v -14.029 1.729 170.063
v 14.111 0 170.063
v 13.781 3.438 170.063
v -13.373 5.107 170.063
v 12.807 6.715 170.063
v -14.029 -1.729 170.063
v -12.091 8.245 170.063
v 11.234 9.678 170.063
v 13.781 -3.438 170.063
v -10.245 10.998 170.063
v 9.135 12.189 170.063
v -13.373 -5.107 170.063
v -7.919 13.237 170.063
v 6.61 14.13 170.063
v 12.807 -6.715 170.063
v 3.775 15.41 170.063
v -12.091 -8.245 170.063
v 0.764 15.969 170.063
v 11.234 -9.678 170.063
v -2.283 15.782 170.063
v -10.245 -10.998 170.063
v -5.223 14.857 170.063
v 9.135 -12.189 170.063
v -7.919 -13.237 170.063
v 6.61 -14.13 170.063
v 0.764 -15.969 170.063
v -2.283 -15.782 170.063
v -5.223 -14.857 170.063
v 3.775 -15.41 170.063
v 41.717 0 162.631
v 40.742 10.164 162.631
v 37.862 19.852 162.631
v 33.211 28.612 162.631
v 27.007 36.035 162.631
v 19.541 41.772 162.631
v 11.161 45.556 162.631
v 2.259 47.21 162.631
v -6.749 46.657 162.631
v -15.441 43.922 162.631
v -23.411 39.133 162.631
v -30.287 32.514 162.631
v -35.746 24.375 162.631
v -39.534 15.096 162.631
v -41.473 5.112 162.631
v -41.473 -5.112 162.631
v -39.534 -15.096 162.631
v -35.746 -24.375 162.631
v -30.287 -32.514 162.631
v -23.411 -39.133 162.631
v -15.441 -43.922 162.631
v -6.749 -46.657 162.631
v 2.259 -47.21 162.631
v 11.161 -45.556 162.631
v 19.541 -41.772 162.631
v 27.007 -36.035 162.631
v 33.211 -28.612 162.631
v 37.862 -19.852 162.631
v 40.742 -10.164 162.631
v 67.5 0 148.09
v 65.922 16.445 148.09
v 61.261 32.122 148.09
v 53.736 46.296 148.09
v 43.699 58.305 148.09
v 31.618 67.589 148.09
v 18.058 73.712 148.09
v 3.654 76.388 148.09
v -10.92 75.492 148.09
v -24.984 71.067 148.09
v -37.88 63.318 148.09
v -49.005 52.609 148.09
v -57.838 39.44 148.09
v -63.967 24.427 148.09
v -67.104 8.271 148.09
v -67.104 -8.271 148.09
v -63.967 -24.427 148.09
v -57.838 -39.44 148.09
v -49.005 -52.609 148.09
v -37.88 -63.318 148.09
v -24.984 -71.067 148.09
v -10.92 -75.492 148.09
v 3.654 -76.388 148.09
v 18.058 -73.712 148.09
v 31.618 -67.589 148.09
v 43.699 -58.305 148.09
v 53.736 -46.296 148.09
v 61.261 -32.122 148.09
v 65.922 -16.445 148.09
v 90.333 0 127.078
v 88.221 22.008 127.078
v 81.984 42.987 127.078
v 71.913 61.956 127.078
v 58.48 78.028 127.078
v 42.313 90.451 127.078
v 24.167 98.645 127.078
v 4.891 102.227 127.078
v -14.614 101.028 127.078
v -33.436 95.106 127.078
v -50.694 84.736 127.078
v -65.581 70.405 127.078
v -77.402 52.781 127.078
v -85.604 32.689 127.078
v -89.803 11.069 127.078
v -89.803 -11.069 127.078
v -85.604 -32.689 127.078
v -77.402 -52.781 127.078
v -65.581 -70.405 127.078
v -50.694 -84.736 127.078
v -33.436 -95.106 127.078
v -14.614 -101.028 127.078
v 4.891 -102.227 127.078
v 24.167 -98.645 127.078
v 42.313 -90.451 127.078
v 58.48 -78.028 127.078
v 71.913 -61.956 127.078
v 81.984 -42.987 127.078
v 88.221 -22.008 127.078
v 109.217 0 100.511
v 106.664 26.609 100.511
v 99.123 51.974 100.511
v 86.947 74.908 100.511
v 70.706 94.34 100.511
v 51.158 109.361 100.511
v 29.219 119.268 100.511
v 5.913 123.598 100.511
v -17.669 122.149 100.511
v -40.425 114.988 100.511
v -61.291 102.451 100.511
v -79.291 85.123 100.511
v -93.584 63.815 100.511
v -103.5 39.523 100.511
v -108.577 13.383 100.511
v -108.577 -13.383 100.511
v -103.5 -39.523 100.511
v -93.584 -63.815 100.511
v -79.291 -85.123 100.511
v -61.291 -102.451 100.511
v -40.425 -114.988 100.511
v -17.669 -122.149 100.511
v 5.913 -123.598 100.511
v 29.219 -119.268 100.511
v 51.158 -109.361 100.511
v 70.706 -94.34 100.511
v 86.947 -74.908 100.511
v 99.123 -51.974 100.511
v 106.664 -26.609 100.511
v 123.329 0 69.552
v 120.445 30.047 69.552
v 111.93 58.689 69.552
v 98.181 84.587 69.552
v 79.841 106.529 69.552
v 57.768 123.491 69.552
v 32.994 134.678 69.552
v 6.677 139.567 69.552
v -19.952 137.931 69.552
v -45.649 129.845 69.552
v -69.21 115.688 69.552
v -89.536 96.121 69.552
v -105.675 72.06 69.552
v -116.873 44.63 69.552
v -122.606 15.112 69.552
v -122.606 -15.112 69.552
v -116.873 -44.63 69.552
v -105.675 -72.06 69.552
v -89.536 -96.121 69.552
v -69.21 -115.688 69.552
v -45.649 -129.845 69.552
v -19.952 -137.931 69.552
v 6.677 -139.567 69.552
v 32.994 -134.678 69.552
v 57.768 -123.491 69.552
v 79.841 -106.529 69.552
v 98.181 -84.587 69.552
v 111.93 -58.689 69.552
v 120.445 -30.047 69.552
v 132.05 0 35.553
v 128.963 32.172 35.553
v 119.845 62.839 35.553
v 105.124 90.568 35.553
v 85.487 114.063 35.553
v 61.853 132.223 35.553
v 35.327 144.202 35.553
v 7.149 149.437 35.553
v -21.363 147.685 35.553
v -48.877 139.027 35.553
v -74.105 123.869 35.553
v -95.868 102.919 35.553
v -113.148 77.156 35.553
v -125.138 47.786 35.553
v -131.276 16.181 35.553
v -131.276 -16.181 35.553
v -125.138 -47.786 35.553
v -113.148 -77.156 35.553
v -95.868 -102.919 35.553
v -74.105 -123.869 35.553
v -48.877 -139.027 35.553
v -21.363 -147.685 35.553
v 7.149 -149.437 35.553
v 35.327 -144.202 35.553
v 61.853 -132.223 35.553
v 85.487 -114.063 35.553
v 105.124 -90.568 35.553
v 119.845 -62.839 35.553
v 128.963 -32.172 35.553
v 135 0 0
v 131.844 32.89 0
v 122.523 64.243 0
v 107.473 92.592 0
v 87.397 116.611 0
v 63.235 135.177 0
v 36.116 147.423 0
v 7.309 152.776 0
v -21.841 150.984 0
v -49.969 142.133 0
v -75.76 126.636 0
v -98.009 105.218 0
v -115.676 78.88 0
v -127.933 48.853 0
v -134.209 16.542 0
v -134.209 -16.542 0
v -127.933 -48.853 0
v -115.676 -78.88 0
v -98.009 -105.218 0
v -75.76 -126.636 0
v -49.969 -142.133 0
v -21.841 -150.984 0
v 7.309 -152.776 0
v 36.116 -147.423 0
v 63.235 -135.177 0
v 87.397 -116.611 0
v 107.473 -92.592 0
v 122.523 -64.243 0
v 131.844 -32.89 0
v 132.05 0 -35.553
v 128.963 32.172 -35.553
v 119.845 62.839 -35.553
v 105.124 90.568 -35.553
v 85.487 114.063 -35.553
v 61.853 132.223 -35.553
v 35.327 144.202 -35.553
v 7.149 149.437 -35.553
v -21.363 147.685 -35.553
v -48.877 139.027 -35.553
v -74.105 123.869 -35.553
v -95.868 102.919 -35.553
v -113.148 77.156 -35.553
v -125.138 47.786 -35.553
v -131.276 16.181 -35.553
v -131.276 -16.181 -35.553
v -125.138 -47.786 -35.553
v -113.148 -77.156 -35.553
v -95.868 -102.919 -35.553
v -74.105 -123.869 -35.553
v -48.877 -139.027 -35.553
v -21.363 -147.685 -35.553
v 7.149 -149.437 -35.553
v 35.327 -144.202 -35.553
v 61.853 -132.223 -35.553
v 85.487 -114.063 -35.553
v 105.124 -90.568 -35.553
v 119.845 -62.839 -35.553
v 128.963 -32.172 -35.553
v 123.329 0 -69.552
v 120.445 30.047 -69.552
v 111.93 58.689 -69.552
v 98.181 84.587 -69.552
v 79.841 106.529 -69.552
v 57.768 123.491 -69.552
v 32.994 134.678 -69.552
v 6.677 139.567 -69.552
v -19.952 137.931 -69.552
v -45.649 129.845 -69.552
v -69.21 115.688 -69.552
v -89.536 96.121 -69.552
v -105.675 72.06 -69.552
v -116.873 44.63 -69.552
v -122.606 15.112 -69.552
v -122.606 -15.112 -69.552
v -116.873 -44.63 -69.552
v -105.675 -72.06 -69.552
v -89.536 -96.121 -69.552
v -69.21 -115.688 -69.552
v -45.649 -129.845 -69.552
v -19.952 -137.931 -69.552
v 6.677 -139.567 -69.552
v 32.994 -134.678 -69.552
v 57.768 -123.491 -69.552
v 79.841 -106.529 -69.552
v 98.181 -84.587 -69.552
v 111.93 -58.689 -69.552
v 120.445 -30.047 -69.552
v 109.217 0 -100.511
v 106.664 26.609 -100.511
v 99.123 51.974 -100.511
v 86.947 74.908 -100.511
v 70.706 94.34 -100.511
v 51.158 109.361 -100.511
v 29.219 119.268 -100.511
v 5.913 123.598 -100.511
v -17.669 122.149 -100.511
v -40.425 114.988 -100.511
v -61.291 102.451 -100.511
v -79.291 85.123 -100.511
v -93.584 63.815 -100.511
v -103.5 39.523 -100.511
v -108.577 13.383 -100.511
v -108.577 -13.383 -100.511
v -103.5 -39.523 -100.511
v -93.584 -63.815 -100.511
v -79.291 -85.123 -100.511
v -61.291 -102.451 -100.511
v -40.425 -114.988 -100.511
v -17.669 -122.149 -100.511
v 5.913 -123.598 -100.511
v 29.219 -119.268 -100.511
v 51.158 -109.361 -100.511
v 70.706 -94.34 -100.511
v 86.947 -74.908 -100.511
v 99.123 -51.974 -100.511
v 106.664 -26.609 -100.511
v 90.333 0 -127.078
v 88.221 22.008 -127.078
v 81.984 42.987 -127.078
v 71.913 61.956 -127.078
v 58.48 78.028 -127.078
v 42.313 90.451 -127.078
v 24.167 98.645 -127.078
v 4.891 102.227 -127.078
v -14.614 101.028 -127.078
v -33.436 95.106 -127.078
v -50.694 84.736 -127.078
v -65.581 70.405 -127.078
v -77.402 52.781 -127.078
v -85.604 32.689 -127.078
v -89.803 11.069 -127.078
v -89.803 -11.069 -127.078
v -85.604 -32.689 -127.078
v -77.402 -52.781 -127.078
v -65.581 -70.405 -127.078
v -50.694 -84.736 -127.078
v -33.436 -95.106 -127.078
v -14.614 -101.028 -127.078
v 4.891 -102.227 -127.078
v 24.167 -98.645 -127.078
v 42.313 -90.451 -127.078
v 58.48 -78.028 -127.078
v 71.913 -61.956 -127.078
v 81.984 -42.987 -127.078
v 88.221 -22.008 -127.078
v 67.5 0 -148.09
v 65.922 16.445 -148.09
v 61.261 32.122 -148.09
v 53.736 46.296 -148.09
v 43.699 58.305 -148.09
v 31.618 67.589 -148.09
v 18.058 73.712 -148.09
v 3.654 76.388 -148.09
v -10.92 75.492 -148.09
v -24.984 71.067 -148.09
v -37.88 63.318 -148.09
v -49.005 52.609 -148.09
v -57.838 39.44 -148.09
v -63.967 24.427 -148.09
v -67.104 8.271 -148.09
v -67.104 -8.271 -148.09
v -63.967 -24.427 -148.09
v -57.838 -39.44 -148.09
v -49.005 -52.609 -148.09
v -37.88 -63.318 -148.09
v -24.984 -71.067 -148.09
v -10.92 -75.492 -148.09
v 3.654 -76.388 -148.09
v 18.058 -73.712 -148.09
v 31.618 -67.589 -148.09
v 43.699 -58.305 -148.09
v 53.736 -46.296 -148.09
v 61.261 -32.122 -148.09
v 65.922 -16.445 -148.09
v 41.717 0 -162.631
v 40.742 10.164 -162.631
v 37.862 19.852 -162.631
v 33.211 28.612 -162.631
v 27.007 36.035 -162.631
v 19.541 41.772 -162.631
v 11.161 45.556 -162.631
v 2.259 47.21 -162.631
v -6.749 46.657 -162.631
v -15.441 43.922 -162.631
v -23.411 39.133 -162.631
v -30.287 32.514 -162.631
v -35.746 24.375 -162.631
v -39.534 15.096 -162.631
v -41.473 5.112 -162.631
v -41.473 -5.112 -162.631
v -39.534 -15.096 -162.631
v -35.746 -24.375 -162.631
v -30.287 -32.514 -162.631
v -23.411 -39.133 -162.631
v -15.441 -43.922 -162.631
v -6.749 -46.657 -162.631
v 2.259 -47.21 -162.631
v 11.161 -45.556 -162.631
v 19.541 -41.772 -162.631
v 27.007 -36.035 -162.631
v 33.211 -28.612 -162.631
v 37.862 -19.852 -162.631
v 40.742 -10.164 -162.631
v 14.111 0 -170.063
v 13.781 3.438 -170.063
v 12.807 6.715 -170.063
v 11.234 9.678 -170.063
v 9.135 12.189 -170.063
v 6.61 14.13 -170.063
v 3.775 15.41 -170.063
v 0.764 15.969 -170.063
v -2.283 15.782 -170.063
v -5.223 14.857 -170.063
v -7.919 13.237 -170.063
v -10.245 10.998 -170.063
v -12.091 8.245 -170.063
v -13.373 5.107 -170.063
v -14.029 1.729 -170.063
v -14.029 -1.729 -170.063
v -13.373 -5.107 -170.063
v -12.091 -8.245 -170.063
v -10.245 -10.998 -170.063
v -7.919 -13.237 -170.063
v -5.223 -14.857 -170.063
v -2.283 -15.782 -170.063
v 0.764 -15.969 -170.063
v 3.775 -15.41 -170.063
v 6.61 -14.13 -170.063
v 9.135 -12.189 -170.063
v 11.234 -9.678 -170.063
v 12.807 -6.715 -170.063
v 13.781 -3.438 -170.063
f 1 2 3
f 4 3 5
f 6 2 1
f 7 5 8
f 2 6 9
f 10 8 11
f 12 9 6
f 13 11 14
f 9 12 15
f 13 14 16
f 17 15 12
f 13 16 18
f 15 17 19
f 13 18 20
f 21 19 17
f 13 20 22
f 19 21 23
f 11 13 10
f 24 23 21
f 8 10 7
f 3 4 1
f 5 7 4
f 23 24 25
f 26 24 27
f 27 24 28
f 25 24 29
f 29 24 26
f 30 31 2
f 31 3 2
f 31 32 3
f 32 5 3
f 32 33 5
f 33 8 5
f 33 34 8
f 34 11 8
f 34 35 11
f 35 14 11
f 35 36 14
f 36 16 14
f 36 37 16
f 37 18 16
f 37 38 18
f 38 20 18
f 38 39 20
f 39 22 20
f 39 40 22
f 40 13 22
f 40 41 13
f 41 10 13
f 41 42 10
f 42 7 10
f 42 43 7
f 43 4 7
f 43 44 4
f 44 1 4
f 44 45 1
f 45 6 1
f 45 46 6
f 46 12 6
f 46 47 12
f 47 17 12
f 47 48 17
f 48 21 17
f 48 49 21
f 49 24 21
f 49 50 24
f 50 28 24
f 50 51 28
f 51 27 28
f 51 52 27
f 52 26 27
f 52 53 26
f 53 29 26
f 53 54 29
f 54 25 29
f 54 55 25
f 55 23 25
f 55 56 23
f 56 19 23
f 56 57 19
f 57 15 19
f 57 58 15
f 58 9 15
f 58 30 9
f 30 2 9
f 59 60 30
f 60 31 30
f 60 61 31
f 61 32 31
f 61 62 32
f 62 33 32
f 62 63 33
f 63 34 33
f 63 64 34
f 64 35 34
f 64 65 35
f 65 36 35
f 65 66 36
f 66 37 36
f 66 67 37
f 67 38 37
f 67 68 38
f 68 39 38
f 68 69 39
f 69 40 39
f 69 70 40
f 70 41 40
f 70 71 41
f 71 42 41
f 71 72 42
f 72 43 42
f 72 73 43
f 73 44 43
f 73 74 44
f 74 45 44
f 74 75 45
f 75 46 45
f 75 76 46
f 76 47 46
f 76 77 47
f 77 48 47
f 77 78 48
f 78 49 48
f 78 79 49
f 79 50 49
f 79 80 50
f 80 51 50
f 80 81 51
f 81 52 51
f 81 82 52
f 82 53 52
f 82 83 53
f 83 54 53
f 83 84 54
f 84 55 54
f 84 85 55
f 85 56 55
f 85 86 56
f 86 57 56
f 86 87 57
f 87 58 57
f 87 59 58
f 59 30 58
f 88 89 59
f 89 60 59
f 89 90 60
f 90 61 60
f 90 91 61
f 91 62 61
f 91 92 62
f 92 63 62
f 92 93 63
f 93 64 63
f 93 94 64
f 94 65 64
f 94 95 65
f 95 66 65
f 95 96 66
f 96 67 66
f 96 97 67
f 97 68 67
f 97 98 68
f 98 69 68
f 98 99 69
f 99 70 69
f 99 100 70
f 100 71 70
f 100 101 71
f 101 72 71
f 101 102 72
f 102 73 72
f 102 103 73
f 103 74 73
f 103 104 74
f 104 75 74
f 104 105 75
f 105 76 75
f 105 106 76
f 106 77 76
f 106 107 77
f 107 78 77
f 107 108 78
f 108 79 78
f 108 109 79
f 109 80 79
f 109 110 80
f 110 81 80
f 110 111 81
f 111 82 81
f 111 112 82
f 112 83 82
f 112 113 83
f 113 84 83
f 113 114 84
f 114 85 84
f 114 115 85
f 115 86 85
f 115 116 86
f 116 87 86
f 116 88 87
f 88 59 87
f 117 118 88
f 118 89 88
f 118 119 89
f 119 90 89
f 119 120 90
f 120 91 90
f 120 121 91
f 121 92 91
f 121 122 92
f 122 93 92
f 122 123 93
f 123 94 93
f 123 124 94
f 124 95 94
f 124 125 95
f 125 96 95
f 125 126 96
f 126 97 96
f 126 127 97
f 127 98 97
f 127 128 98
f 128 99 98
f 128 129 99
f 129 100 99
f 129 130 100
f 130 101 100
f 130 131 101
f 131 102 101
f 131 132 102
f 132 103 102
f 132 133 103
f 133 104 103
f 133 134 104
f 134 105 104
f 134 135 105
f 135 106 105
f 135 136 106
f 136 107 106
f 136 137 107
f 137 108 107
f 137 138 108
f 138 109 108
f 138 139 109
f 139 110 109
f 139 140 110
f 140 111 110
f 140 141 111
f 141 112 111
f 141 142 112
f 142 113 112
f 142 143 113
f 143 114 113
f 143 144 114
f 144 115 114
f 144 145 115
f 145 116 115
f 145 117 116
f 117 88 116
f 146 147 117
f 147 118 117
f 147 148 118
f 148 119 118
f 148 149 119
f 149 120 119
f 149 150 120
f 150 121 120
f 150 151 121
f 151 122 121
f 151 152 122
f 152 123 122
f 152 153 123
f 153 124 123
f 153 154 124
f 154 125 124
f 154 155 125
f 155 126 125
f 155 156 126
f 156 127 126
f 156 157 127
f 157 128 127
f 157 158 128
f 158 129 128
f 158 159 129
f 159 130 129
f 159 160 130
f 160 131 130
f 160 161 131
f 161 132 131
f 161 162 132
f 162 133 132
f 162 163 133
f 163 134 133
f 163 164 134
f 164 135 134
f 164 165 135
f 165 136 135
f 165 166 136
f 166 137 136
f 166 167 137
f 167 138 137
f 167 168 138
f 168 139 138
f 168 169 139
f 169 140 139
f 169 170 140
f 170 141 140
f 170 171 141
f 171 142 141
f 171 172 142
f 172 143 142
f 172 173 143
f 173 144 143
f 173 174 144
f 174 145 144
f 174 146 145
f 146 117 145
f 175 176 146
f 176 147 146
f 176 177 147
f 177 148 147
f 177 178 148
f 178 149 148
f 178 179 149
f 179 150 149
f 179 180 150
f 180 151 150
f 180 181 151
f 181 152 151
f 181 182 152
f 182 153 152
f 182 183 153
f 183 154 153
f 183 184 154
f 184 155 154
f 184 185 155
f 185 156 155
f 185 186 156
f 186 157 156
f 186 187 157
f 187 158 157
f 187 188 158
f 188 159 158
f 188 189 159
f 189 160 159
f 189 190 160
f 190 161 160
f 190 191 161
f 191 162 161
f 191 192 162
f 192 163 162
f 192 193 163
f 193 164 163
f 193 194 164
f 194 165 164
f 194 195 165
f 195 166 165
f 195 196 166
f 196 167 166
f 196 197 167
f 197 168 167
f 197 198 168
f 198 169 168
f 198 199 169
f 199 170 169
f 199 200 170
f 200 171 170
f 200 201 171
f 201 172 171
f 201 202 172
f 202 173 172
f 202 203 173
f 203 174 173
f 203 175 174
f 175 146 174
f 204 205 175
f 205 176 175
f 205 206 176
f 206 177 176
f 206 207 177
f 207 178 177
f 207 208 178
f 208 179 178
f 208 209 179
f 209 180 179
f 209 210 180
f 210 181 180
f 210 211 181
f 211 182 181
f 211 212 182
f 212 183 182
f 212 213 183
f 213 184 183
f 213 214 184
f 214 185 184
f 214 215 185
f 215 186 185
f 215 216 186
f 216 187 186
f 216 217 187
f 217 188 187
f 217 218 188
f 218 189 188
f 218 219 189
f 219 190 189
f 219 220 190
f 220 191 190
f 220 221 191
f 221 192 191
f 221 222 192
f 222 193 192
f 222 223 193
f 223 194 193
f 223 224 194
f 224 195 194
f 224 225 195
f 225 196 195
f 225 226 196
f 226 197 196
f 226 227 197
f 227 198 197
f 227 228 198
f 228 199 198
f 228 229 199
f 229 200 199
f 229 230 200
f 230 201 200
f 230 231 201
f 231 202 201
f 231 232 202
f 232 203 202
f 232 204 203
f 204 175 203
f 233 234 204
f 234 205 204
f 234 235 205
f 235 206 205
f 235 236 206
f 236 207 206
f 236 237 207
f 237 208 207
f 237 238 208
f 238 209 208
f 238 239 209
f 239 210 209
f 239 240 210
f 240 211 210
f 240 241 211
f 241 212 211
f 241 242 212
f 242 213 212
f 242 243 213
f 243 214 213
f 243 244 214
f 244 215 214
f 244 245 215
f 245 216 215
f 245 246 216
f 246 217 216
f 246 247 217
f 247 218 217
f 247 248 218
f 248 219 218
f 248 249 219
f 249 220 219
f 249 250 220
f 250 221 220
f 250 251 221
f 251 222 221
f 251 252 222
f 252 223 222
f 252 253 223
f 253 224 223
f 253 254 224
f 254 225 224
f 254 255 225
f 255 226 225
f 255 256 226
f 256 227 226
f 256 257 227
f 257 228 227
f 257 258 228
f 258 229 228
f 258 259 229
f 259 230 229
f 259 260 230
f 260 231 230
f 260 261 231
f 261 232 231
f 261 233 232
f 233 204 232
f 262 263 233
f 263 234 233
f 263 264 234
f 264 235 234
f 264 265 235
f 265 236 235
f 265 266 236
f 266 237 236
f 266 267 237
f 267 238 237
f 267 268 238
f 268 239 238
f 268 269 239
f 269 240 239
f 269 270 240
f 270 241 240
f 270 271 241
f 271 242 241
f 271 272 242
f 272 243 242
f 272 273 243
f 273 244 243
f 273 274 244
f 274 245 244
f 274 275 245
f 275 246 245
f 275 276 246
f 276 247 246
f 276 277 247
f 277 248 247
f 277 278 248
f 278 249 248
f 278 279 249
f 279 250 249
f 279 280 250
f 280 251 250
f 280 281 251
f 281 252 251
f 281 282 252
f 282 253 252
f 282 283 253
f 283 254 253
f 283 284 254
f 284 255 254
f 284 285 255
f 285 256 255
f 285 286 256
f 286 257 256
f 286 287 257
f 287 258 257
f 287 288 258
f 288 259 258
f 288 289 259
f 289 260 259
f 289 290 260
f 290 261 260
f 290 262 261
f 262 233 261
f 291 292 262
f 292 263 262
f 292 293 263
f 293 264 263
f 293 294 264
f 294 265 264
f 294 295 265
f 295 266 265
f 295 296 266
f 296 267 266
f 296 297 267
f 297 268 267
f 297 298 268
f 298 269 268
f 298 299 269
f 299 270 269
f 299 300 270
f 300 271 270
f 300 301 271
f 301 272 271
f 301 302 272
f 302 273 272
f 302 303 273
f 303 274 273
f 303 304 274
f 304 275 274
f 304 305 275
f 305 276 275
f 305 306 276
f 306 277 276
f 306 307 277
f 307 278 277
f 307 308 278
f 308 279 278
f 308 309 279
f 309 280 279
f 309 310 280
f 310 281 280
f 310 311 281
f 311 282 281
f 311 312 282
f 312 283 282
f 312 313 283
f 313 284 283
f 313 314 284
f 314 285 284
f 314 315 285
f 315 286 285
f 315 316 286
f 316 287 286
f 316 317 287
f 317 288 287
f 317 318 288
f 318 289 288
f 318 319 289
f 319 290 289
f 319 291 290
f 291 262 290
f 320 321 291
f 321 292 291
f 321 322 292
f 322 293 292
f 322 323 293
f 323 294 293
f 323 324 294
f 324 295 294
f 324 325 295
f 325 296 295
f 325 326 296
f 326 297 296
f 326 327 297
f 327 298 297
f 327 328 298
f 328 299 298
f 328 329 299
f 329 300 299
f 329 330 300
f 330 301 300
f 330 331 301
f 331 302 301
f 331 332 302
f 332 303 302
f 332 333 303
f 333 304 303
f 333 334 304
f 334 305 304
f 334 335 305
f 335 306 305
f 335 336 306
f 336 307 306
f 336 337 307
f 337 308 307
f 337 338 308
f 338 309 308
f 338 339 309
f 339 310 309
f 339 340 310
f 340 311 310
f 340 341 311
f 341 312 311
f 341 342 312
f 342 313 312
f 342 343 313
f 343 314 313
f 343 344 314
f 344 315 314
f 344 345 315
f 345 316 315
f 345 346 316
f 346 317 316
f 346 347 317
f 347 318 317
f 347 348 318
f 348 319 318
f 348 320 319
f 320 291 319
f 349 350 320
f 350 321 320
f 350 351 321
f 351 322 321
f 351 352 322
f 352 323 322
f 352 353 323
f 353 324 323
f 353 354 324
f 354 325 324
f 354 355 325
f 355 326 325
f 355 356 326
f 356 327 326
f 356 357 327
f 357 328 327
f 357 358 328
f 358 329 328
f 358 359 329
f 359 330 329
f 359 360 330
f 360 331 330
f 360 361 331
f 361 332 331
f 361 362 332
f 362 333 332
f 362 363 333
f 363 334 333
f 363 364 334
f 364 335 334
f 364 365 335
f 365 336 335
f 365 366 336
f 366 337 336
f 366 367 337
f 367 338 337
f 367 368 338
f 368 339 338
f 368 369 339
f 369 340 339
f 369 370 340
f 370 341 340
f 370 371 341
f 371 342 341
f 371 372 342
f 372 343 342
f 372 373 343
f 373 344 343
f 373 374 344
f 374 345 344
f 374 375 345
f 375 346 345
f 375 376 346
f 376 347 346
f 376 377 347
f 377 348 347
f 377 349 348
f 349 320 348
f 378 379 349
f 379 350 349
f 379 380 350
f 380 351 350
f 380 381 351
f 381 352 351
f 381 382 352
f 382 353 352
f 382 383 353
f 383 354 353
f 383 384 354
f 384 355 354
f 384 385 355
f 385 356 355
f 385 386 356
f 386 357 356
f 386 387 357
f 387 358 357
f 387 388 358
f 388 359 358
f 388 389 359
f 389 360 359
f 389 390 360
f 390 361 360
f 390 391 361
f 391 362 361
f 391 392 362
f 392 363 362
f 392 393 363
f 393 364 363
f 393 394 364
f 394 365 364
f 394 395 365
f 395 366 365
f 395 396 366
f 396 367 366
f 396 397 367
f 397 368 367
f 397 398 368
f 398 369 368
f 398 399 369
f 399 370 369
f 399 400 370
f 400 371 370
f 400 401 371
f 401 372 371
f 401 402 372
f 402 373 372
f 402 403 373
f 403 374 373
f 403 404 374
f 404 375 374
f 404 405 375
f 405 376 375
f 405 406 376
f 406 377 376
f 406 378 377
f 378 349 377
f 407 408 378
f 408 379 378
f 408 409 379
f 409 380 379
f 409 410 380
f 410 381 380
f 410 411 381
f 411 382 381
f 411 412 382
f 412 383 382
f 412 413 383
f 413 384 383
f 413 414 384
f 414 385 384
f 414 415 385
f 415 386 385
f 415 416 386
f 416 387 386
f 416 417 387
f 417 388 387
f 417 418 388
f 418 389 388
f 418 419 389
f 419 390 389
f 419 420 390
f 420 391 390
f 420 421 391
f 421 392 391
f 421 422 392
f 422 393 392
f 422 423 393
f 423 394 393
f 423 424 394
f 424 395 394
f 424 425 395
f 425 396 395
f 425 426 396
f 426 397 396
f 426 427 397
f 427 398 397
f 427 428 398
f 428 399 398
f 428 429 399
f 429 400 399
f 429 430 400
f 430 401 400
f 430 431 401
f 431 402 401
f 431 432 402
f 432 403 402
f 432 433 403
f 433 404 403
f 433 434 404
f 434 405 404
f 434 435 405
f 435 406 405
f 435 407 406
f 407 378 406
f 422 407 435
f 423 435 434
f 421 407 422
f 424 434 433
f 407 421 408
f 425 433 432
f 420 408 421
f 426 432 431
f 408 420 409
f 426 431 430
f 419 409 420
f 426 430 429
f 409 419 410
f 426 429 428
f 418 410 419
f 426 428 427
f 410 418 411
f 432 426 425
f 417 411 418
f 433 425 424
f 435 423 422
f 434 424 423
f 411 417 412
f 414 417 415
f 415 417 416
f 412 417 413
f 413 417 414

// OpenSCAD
// Generated by SolidPython 1.0.1 on 2020-07-29 00:46:52


scale(v = [15, 17, 19]) {
	sphere(r = 9);
}
/***********************************************
*********      SolidPython code:      **********
************************************************
 
# import packages: SolidPython
from solid import *
from solid.utils import *
from itertools import chain, combinations, permutations


class Resize:

    def __init__(self, scad_file):
        self.scad_file = scad_file
        #self.scad_file = import_scad(scad_file)
        # cone/cylinder param:
        self.r1 = 0
        self.r2 = 0
        self.h = 0
        # rectangular prism param:
        self.w = 0
        self.l = 0
        # ellipse param:
        self.r = 0

    # import OpenScad code (file name corresponds to shape)


    # classify shape + parameters
    def assign(self, param1, param2, param3):
        if self.scad_file == 'cone.scad':
            self.r1 = param1
            self.r2 = param2
            self.h = param3
        elif self.scad_file == 'cylinder.scad':
            self.r1 = param1
            self.r2 = param2
            self.h = param3
        elif self.scad_file == 'rectangularPrism.scad':
            self.h = param1
            self.l = param2
            self.w = param3
        else:
            self.r = param1
            self.h = param2

    # resize parameters
    def iterate(self):
        x = range(3, 20, 2)
        i = 1
        if self.scad_file == 'cone.scad':
            tempList = list(permutations(x, 2))
            for temp in tempList:
                param1 = temp[0]
                param2 = temp[1]
                filepath = 'produced_scad_files/' + 'cone' + str(param1) + '_' + str(param2) + '_' + '.scad'
                scad_render_to_file(cylinder(h=param1, r1=param2, r2=0), filepath)

        elif self.scad_file == 'cylinder.scad':
            tempList = list(permutations(x, 3))
            for temp in tempList:
                param1 = temp[0]
                param2 = temp[1]
                filepath = 'produced_scad_files/' + 'cylinder' + str(param1) + '_' + str(param2) + '_' + '.scad'
                scad_render_to_file(cylinder(h=param1, r1=param2, r2=param2), filepath)

        elif self.scad_file == 'rectangularPrism.scad':
            tempList = list(permutations(x, 3))
            for temp in tempList:
                param1 = temp[0]
                param2 = temp[1]
                param3 = temp[2]
                filepath = 'produced_scad_files/' + 'rectangularPrism' + str(param1) + '_' + str(param2) + '_' + str(
                    param3) + '.scad'
                scad_render_to_file(cube(size=(param1, param2, param3)), filepath)

        elif self.scad_file == 'ellipse.scad':
            tempList = list(permutations(x, 4))
            for temp in tempList:
                param1 = temp[0]
                param2 = temp[1]
                param3 = temp[2]
                param4 = temp[3]
                filepath = 'produced_scad_files/' + 'ellipse' + str(param1) + '_' + str(param2) + '_' + str(param3) + '_' + str(param4) + '.scad'
                scad_render_to_file(scale([param1, param2, param3])(sphere(r=param4)), filepath)

    def render_to_scadfile(self):
        scad_render_to_file(scad, 'example.scad') 
 
************************************************/
